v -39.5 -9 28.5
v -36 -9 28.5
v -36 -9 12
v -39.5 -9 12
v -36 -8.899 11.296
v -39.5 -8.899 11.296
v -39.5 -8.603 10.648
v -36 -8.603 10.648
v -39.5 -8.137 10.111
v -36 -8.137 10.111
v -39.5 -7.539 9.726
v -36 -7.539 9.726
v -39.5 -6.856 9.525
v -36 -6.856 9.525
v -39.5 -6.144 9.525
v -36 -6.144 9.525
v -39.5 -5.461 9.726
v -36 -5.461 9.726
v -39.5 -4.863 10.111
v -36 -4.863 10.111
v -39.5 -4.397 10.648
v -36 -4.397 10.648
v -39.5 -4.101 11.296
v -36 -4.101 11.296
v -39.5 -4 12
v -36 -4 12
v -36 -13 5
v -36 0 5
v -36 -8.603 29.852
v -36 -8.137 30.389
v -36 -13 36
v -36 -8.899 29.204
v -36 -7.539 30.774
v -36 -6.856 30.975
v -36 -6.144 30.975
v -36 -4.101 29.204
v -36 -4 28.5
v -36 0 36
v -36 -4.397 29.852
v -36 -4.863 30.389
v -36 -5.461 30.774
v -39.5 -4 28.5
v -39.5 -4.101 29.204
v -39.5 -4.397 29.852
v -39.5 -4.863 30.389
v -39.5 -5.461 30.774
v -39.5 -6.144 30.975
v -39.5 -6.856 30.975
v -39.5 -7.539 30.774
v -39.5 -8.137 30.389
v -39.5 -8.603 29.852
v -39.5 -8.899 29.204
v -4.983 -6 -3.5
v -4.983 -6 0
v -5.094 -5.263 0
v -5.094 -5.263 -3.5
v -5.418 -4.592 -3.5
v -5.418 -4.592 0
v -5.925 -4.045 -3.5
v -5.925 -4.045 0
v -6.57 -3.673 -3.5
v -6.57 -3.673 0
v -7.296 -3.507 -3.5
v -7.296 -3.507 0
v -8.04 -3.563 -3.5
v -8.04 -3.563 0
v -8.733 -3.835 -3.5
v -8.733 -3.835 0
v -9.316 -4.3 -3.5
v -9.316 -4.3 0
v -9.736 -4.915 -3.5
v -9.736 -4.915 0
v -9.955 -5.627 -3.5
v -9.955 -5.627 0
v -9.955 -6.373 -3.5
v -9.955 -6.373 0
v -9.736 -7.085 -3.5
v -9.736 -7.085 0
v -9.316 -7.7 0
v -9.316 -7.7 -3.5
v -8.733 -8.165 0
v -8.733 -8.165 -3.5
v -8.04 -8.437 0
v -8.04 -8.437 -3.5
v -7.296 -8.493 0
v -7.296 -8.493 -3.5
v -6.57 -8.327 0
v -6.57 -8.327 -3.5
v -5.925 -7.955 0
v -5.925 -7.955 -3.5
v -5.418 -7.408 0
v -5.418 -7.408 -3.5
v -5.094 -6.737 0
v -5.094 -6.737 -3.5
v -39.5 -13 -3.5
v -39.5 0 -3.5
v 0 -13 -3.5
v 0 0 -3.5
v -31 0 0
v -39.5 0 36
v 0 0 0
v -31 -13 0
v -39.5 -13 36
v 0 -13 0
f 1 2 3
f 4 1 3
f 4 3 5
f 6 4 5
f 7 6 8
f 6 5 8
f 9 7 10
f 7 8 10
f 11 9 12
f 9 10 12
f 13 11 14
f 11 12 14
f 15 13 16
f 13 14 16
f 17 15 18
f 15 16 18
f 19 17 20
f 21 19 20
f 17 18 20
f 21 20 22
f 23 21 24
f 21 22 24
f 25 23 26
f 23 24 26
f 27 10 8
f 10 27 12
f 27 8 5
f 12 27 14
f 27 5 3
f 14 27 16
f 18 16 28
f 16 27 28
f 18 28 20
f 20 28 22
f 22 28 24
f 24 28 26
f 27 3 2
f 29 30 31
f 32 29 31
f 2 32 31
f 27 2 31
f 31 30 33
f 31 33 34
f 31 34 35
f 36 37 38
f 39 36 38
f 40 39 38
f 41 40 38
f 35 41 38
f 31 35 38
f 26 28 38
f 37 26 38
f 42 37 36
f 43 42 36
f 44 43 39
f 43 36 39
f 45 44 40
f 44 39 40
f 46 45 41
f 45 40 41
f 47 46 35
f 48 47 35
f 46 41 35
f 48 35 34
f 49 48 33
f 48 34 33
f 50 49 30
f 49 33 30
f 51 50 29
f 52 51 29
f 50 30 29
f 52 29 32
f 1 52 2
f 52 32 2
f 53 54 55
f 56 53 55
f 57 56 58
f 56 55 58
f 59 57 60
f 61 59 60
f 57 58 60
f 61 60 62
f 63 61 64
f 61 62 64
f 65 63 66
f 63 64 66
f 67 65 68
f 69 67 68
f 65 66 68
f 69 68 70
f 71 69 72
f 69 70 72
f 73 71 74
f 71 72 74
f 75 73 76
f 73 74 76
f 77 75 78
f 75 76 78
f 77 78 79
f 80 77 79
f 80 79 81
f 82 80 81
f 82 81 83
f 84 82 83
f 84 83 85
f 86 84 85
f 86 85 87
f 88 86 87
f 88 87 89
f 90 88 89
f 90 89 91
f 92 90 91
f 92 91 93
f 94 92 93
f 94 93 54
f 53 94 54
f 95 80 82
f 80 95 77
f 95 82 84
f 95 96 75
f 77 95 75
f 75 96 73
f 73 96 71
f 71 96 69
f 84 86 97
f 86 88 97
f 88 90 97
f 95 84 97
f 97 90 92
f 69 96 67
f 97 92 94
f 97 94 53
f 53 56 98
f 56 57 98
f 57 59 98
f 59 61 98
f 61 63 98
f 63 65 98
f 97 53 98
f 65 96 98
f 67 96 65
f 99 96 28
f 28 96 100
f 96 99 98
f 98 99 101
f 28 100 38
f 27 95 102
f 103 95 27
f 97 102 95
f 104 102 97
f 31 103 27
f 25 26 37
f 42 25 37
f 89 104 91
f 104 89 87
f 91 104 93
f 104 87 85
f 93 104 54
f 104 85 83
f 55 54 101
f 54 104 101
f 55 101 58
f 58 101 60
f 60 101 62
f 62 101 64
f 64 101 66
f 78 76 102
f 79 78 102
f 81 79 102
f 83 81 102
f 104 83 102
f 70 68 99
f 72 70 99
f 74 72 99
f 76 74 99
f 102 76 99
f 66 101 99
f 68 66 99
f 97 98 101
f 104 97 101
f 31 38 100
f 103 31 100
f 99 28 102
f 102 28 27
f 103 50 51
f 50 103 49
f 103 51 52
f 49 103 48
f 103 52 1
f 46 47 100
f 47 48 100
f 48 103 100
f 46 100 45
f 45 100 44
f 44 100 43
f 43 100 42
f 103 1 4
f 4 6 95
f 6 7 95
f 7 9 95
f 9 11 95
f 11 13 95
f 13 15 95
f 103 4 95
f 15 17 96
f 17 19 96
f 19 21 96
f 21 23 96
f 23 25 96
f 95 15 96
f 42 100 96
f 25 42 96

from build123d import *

# Parameters (mm, degrees)
F1_DEPTH = 13
F3_DEPTH = 25
F4_R     = 2.5
F5_DEPTH = 25
F6_SIZE  = 5


with BuildPart() as f1:
    # F0 (on Front) → F1 (new body)
    with BuildSketch(Plane.XZ):
        Polygon((0, -3.5), (0, 0), (-36, 0), (-36, 36), (-39.5, 36), (-39.5, -3.5), align=None)
    extrude(amount=F1_DEPTH)

    # F2 (on face) → F3 (cut)
    with BuildSketch(Plane.YZ.offset(-36)):
        with BuildLine():
            ThreePointArc((-9, 28.5), (-6.5, 26), (-4, 28.5))
            ThreePointArc((-4, 28.5), (-6.5, 31), (-9, 28.5))
        make_face()
        with BuildLine():
            Line((-4, 12), (-4, 28.5))
            ThreePointArc((-4, 28.5), (-6.5, 26), (-9, 28.5))
            Line((-9, 28.5), (-9, 12))
            ThreePointArc((-9, 12), (-6.5, 14.5), (-4, 12))
        make_face()
        with BuildLine():
            ThreePointArc((-9, 12), (-6.5, 9.5), (-4, 12))
            ThreePointArc((-4, 12), (-6.5, 14.5), (-9, 12))
        make_face()
    extrude(amount=-F3_DEPTH, mode=Mode.SUBTRACT)

    # F4 (on face) → F5 (cut)
    with BuildSketch(Plane.XY):
        with Locations((-7.483315, -6)):
            Circle(F4_R)
    extrude(amount=-F5_DEPTH, mode=Mode.SUBTRACT)

    # F6
    f6_edges = [f1.edges().sort_by_distance(p)[0] for p in [
        (-36, -6.5, 0),
    ]]
    chamfer(f6_edges, length=F6_SIZE)


solid = f1.part
